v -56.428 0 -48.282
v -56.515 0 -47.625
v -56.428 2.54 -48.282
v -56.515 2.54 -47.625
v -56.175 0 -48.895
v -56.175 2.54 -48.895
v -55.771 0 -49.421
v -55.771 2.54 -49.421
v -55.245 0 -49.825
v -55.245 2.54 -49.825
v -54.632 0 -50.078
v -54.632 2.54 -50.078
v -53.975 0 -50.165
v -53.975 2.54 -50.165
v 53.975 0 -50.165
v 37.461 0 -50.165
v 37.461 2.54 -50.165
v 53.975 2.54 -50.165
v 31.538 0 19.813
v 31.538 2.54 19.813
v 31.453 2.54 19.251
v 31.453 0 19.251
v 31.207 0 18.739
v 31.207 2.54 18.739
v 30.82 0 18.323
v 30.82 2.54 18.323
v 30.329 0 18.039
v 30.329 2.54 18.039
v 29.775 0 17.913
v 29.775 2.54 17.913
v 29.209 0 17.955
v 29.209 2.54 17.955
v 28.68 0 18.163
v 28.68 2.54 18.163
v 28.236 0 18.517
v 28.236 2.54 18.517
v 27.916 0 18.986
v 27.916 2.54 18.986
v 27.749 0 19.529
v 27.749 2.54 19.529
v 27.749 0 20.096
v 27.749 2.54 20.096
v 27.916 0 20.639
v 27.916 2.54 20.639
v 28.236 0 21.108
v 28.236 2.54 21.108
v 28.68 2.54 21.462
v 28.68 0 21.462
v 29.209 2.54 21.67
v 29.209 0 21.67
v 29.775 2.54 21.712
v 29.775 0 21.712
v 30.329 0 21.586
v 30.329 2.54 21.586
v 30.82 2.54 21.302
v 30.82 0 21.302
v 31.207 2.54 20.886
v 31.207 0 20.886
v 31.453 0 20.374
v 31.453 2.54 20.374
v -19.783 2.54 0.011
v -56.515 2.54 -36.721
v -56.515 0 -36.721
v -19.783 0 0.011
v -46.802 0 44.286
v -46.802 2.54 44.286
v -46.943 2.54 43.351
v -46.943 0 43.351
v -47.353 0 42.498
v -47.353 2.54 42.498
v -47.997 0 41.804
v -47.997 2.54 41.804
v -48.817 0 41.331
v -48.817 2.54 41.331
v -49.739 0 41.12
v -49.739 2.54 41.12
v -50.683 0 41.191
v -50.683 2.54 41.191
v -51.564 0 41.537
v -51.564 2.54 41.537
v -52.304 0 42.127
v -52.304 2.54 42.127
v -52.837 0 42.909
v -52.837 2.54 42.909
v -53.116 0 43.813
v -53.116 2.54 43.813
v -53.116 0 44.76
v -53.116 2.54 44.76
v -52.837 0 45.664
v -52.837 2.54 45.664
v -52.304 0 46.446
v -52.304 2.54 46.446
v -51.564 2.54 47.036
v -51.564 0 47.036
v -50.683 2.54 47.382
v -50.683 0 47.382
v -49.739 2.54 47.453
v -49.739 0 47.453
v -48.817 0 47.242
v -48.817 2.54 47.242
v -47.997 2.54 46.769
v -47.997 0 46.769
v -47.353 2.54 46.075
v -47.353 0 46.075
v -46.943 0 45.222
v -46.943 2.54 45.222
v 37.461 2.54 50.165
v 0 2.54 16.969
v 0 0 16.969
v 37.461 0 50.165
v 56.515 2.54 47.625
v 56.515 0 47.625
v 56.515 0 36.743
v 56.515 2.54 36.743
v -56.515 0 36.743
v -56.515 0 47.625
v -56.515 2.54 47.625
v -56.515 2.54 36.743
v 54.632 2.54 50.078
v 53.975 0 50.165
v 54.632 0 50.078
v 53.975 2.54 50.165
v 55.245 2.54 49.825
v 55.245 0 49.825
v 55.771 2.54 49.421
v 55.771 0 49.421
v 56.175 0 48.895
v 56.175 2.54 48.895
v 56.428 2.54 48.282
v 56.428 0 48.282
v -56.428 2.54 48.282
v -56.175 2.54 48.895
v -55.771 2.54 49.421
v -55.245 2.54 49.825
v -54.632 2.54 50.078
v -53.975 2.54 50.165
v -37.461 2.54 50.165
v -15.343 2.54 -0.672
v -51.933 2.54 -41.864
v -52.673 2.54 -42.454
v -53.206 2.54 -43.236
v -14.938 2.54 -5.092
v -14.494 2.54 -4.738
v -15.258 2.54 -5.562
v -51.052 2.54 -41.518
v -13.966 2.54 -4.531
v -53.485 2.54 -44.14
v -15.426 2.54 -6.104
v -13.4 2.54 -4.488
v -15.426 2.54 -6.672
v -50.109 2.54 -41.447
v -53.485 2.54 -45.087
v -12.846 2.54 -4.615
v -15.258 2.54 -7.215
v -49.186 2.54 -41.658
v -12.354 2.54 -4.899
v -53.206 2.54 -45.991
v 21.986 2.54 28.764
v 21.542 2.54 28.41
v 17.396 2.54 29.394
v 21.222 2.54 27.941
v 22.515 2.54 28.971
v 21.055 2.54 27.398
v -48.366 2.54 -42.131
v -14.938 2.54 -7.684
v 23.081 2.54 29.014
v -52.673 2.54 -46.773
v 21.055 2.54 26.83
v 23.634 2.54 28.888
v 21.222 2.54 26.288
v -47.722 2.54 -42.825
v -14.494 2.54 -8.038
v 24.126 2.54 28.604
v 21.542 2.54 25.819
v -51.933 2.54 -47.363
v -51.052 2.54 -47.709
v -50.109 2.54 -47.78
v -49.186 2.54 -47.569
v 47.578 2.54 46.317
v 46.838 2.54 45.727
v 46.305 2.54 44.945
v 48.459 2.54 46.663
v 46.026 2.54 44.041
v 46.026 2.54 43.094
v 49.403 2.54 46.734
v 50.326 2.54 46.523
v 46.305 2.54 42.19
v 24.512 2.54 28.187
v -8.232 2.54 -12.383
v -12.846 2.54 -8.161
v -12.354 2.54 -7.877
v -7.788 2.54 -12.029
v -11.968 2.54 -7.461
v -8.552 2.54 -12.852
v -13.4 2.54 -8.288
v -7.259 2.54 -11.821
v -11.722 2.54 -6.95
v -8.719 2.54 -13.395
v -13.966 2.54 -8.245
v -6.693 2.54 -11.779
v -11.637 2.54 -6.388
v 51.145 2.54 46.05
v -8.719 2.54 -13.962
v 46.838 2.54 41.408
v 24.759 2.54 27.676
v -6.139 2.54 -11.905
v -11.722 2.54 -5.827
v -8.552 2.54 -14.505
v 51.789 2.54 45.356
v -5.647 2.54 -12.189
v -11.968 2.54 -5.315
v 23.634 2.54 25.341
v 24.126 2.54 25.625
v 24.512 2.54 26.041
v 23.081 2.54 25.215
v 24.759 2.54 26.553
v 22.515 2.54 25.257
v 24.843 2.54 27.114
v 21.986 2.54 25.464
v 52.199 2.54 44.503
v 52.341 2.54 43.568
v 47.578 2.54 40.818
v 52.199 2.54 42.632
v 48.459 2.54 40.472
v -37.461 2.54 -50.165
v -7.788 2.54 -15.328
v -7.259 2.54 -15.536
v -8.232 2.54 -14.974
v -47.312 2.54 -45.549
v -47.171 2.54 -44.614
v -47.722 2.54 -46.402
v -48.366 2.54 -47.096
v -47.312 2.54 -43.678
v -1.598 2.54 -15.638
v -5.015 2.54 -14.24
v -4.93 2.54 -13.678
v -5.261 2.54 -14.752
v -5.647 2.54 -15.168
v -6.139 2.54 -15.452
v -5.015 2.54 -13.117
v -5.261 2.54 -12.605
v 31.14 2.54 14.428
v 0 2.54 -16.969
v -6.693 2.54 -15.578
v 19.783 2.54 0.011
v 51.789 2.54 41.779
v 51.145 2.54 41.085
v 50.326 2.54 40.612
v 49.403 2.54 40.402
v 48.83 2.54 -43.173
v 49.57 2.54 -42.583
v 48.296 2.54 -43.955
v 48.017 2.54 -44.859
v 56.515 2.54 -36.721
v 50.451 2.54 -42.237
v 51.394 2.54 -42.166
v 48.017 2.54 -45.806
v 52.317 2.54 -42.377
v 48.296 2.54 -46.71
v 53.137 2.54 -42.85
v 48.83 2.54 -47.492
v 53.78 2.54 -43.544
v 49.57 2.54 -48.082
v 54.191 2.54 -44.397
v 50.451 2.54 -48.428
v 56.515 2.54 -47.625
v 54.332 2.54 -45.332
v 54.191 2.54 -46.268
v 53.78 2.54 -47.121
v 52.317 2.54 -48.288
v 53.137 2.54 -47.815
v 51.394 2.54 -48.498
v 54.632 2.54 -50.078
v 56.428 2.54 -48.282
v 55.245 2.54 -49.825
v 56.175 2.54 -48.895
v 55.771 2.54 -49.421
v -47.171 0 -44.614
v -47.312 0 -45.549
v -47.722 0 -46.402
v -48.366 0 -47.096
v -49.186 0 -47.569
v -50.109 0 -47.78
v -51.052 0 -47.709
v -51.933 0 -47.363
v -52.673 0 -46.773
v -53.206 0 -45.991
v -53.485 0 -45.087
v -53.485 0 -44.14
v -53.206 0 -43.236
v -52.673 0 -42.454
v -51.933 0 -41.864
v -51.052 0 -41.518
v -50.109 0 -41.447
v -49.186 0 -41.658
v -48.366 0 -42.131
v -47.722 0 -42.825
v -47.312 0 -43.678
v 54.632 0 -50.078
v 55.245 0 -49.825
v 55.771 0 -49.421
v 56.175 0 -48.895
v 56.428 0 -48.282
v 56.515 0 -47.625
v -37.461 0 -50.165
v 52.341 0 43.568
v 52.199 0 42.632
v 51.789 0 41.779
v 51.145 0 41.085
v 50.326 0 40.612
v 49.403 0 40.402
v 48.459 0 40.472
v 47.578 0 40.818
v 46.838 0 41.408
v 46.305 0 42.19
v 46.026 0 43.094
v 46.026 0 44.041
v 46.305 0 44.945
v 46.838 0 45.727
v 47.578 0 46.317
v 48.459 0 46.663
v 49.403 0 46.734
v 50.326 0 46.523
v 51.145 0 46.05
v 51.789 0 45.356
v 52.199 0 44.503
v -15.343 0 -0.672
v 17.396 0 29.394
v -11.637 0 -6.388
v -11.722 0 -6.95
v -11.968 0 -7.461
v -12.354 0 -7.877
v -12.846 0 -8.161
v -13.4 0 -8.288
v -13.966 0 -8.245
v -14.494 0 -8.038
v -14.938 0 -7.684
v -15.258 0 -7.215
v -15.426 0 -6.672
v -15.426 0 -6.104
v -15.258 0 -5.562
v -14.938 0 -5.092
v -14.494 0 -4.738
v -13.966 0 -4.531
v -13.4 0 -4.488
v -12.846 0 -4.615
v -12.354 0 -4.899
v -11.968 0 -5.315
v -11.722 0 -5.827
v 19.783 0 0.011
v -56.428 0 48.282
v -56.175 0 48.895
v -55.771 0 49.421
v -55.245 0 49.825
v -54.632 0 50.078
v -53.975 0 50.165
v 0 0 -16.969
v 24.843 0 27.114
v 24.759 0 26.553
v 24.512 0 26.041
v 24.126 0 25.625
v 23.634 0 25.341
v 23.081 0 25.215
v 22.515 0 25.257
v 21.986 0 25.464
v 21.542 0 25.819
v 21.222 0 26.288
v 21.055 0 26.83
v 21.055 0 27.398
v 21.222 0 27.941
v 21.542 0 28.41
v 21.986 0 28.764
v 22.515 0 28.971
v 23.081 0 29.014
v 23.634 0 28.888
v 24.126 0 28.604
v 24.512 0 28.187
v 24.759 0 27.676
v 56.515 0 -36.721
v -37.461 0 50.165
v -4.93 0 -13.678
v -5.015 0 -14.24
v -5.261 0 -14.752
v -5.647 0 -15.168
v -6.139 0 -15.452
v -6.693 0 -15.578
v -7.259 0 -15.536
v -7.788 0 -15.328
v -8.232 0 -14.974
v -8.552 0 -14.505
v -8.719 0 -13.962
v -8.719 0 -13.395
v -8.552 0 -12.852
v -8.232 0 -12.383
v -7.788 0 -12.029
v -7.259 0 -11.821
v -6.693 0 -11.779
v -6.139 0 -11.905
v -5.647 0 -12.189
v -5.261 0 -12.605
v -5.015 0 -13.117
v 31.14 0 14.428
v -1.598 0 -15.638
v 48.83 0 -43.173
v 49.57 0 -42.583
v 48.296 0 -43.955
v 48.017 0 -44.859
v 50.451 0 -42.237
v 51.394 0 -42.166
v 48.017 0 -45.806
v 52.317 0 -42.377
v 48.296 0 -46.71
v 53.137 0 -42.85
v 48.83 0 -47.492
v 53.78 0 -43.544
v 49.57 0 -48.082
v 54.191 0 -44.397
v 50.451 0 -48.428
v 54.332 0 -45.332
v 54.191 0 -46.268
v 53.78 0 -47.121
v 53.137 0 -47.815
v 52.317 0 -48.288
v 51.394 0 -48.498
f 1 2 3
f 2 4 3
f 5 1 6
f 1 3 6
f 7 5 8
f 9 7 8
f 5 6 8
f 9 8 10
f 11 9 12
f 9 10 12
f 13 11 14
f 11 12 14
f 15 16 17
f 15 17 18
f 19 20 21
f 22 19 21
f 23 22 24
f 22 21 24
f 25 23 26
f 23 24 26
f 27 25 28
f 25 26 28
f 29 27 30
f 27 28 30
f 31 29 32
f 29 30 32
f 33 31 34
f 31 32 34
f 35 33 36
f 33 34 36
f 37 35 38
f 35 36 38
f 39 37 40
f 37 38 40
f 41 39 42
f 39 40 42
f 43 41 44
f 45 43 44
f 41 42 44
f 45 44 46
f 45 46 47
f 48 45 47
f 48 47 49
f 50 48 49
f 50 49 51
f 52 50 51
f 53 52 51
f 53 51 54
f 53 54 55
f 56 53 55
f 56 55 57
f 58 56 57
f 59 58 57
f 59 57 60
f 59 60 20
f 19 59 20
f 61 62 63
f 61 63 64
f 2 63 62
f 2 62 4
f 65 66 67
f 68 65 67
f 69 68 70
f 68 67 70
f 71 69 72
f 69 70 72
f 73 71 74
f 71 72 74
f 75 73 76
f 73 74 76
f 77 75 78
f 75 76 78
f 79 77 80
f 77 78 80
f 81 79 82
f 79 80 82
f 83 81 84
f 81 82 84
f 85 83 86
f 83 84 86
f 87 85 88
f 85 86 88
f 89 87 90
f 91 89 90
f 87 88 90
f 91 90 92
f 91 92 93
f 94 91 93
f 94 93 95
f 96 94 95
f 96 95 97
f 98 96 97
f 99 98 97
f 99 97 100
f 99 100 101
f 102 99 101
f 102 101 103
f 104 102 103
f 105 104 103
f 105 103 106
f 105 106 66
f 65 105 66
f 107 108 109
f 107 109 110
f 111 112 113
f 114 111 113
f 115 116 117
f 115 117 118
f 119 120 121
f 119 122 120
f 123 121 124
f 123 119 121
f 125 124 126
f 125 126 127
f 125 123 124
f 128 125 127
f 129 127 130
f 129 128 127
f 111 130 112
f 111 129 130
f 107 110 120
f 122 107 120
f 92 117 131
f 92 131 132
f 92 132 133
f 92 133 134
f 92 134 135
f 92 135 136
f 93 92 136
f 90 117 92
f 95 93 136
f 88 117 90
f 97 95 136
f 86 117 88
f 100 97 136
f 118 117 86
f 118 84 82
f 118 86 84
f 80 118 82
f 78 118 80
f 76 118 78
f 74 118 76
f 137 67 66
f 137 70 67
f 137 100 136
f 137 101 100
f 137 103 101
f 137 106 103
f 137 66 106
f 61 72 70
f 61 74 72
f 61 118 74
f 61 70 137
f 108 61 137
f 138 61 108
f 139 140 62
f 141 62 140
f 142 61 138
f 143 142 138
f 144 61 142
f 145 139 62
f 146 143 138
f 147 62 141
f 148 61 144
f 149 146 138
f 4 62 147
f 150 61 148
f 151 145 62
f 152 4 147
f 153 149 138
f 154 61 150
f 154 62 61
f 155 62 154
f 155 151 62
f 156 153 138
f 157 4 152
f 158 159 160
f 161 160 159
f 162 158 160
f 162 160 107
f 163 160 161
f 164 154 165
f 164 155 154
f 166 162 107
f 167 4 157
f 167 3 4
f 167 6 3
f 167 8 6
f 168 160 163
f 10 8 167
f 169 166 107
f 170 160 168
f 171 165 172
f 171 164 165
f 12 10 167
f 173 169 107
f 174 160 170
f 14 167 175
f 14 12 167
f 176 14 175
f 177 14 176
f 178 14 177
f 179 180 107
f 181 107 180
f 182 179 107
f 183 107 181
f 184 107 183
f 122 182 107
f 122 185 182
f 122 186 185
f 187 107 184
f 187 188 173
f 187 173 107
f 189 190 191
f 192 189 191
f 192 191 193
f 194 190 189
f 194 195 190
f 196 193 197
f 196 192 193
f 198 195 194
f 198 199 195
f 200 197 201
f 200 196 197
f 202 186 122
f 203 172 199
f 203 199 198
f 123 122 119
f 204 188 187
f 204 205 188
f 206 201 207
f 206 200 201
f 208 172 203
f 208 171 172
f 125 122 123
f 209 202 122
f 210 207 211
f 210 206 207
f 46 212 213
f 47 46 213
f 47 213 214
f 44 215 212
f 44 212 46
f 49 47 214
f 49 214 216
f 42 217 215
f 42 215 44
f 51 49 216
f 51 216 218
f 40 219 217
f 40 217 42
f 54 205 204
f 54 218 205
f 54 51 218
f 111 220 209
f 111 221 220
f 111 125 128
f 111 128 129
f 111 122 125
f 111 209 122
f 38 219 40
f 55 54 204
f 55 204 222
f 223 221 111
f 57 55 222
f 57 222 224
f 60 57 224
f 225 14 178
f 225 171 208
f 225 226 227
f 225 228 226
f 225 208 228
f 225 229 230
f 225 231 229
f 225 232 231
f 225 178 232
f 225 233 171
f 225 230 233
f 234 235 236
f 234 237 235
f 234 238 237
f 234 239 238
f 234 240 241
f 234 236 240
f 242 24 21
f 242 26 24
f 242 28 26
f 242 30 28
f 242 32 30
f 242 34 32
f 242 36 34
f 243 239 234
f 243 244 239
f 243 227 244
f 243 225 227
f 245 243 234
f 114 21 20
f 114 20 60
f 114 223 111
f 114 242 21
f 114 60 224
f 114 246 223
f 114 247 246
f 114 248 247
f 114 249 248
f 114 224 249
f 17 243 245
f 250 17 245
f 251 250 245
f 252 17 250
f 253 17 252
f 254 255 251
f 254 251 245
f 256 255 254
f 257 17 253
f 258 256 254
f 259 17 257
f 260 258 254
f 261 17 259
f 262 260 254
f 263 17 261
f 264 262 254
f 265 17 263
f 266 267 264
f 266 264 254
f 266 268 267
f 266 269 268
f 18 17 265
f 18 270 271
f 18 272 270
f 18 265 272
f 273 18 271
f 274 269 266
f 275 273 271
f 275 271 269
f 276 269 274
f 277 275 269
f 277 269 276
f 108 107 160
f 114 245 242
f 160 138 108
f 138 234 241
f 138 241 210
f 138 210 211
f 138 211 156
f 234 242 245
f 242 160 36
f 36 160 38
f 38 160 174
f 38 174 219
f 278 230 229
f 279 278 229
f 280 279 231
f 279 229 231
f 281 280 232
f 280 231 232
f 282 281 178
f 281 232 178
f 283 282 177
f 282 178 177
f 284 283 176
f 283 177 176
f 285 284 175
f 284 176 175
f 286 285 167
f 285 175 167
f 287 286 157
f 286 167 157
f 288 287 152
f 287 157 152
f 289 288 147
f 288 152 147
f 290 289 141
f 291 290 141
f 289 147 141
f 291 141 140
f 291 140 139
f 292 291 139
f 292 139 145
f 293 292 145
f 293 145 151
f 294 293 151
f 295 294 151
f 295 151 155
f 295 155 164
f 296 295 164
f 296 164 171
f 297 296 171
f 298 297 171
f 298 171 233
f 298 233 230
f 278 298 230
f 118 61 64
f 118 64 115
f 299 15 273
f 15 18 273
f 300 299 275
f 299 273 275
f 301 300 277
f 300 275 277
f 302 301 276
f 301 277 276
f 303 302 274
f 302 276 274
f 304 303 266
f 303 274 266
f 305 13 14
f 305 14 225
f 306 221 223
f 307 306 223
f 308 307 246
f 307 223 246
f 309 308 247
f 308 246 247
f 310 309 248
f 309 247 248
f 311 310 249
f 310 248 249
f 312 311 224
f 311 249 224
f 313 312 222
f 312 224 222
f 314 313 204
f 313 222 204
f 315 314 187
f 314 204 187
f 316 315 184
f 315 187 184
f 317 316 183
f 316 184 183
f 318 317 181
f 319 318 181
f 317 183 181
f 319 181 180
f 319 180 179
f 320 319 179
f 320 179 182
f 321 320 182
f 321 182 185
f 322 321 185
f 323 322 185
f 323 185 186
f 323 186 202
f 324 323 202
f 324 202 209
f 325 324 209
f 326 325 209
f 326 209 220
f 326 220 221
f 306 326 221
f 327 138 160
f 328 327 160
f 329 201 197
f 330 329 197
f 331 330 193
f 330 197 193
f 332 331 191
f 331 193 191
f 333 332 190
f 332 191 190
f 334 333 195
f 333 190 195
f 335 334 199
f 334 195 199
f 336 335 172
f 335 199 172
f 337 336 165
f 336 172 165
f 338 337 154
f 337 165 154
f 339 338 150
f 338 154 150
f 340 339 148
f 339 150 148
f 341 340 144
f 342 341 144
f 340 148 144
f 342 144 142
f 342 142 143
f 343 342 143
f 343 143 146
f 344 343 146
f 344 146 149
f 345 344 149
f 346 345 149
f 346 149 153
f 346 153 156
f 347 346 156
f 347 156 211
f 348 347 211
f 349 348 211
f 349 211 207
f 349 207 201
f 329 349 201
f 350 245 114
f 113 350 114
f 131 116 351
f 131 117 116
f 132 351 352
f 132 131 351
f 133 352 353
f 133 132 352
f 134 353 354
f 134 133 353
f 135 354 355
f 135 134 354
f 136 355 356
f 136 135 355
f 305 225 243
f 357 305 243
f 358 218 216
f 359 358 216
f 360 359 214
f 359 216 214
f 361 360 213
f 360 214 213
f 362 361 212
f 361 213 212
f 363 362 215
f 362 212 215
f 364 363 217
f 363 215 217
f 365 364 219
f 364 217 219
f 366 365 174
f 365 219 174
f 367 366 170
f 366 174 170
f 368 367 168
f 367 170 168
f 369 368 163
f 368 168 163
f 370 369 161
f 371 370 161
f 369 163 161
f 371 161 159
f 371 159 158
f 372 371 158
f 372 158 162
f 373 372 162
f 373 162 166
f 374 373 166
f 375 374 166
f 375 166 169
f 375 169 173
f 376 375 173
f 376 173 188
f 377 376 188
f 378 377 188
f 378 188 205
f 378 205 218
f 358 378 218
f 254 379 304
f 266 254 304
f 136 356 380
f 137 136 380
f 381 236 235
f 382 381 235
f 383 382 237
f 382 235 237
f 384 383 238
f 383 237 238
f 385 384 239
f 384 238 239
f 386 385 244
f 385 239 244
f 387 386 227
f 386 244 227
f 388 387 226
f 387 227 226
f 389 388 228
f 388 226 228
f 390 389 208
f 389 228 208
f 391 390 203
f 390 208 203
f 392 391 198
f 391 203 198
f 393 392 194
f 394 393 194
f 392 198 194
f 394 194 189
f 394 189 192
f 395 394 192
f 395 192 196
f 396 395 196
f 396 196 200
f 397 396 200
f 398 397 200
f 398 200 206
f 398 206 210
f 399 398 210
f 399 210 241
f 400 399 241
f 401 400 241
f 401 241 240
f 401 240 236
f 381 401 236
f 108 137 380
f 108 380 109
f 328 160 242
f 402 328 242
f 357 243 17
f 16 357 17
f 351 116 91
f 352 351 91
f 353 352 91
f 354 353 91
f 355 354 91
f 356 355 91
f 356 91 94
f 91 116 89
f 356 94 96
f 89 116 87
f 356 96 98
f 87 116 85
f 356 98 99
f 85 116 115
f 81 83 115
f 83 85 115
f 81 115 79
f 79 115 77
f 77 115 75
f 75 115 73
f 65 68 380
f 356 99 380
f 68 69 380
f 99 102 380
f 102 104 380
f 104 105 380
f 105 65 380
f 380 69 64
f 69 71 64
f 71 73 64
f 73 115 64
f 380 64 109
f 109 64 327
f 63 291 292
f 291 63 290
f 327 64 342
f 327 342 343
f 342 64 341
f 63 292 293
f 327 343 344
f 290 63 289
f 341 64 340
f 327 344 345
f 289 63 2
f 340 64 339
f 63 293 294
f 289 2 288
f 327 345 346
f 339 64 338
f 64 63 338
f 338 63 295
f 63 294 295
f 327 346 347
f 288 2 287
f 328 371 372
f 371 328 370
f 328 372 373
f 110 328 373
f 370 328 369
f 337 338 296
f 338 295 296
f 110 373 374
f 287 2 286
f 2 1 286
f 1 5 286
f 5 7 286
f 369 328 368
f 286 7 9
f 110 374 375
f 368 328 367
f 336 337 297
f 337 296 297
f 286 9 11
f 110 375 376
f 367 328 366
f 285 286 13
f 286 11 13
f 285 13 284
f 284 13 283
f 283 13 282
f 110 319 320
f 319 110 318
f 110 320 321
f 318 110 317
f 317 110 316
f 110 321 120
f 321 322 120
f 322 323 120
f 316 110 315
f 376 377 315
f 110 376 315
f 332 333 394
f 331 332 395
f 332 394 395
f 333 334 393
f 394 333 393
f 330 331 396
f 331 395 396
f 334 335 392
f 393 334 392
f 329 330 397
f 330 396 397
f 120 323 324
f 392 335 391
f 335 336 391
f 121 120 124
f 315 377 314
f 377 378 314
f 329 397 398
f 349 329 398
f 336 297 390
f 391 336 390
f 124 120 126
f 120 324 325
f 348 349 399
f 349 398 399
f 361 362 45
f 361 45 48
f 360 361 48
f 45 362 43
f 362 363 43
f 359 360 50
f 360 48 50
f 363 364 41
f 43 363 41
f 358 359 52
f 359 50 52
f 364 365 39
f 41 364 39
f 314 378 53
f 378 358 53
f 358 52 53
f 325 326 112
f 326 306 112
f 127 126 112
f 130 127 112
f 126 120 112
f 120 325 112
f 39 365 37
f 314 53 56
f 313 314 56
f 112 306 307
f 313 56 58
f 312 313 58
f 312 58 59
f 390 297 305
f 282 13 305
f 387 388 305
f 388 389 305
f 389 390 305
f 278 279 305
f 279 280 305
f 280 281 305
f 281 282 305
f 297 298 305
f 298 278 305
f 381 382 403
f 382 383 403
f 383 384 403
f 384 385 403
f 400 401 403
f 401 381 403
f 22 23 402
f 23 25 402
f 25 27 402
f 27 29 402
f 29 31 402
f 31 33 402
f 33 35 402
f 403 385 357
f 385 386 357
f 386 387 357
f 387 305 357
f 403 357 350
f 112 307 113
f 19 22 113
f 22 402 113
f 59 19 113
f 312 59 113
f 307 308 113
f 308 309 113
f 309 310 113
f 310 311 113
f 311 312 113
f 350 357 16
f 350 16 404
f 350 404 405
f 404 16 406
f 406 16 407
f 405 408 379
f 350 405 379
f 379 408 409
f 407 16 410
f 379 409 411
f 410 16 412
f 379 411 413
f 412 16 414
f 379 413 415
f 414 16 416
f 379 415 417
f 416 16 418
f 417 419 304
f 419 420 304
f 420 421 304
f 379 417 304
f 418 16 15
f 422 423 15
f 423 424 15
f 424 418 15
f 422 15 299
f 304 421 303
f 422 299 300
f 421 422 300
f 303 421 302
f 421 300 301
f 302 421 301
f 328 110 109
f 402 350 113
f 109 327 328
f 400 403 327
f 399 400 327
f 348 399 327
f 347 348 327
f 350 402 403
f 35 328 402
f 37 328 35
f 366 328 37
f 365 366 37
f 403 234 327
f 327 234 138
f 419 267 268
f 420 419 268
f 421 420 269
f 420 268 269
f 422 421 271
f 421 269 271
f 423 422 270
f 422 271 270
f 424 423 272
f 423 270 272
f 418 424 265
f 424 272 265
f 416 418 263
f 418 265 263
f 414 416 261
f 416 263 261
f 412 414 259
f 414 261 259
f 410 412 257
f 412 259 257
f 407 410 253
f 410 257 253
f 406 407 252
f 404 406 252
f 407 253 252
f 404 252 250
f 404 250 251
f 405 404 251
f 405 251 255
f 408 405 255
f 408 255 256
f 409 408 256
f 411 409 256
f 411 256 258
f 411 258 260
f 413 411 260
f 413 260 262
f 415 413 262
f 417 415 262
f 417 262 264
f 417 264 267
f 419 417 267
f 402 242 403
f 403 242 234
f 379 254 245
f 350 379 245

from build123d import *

# Parameters (mm, degrees)
SKETCH2_W           = 113.03
SKETCH2_H           = 100.33
BOSS_EXTRUDE1_DEPTH = 2.54
FILLET1_R           = 2.54
FILLET2_R           = 2.54
CUT_EXTRUDE1_DEPTH  = 3.54
SKETCH5_R           = 3.175
CUT_EXTRUDE2_DEPTH  = 3.54
CUT_EXTRUDE3_DEPTH  = 3.54
SKETCH9_R           = 1.905
CUT_EXTRUDE4_DEPTH  = 5.08


with BuildPart() as part:
    # Sketch2 → Boss-Extrude1 (new body)
    with BuildSketch(Plane(origin=(0, 0, 0), x_dir=(1, 0, 0), z_dir=(0, 1, 0))):
        Rectangle(SKETCH2_W, SKETCH2_H)
    extrude(amount=BOSS_EXTRUDE1_DEPTH)

    # Fillet1
    fillet1_edges = [part.edges().sort_by_distance(p)[0] for p in [
        (-56.515, 1.27, -50.165),
    ]]
    fillet(fillet1_edges, radius=FILLET1_R)

    # Fillet2
    fillet2_edges = [part.edges().sort_by_distance(p)[0] for p in [
        (56.515, 1.27, 50.165),
        (-56.515, 1.27, 50.165),
        (56.515, 1.27, -50.165),
    ]]
    fillet(fillet2_edges, radius=FILLET2_R)

    # Sketch4 → Cut-Extrude1 (cut, through all)
    with BuildSketch(Plane(origin=(0, 2.54, 0), x_dir=(1, 0, 0), z_dir=(0, 1, 0))):
        Polygon((-37.461428175, 50.165), (0, 16.968868313), (37.461428175, 50.165), align=None)
        Polygon((0, -16.968868313), (37.461428175, -50.165), (-37.461428175, -50.165), align=None)
        Polygon((-56.515, 36.721051224), (-19.783044536, -0.01090424), (-56.515, -36.742859704), align=None)
        Polygon((19.783044536, -0.01090424), (56.515, -36.742859704), (56.515, 36.721051224), align=None)
    extrude(amount=-CUT_EXTRUDE1_DEPTH, mode=Mode.SUBTRACT)

    # Sketch5 → Cut-Extrude2 (cut, through all)
    with BuildSketch(Plane(origin=(0, 2.54, 0), x_dir=(1, 0, 0), z_dir=(0, 1, 0))):
        with Locations((-50.345804437, 44.613514098)):
            Circle(SKETCH5_R)
        with Locations((49.165550163, -43.56764163)):
            Circle(SKETCH5_R)
        with Locations((51.157011398, 45.33235837)):
            Circle(SKETCH5_R)
        with Locations((-49.976757123, -44.286485902)):
            Circle(SKETCH5_R)
    extrude(amount=-CUT_EXTRUDE2_DEPTH, mode=Mode.SUBTRACT)

    # Sketch8 → Cut-Extrude3 (cut, through all)
    with BuildSketch(Plane(origin=(0, 2.54, 0), x_dir=(1, 0, 0), z_dir=(0, 1, 0))):
        Polygon((-15.34300557, 0.671713564), (17.39574797, -29.394488667), (31.140297562, -14.428201334), (-1.598455979, 15.638000897), align=None)
    extrude(amount=-CUT_EXTRUDE3_DEPTH, mode=Mode.SUBTRACT)

    # Sketch9 → Cut-Extrude4 (cut)
    with BuildSketch(Plane(origin=(0, 2.54, 0), x_dir=(1, 0, 0), z_dir=(0, 1, 0))):
        with Locations((22.938442662, -27.1142567)):
            Circle(SKETCH9_R)
        with Locations((29.632724368, -19.812515234)):
            Circle(SKETCH9_R)
        with Locations((-13.541882712, 6.388082929)):
            Circle(SKETCH9_R)
        with Locations((-6.83523338, 13.678466371)):
            Circle(SKETCH9_R)
    extrude(amount=-CUT_EXTRUDE4_DEPTH, mode=Mode.SUBTRACT)


solid = part.part
